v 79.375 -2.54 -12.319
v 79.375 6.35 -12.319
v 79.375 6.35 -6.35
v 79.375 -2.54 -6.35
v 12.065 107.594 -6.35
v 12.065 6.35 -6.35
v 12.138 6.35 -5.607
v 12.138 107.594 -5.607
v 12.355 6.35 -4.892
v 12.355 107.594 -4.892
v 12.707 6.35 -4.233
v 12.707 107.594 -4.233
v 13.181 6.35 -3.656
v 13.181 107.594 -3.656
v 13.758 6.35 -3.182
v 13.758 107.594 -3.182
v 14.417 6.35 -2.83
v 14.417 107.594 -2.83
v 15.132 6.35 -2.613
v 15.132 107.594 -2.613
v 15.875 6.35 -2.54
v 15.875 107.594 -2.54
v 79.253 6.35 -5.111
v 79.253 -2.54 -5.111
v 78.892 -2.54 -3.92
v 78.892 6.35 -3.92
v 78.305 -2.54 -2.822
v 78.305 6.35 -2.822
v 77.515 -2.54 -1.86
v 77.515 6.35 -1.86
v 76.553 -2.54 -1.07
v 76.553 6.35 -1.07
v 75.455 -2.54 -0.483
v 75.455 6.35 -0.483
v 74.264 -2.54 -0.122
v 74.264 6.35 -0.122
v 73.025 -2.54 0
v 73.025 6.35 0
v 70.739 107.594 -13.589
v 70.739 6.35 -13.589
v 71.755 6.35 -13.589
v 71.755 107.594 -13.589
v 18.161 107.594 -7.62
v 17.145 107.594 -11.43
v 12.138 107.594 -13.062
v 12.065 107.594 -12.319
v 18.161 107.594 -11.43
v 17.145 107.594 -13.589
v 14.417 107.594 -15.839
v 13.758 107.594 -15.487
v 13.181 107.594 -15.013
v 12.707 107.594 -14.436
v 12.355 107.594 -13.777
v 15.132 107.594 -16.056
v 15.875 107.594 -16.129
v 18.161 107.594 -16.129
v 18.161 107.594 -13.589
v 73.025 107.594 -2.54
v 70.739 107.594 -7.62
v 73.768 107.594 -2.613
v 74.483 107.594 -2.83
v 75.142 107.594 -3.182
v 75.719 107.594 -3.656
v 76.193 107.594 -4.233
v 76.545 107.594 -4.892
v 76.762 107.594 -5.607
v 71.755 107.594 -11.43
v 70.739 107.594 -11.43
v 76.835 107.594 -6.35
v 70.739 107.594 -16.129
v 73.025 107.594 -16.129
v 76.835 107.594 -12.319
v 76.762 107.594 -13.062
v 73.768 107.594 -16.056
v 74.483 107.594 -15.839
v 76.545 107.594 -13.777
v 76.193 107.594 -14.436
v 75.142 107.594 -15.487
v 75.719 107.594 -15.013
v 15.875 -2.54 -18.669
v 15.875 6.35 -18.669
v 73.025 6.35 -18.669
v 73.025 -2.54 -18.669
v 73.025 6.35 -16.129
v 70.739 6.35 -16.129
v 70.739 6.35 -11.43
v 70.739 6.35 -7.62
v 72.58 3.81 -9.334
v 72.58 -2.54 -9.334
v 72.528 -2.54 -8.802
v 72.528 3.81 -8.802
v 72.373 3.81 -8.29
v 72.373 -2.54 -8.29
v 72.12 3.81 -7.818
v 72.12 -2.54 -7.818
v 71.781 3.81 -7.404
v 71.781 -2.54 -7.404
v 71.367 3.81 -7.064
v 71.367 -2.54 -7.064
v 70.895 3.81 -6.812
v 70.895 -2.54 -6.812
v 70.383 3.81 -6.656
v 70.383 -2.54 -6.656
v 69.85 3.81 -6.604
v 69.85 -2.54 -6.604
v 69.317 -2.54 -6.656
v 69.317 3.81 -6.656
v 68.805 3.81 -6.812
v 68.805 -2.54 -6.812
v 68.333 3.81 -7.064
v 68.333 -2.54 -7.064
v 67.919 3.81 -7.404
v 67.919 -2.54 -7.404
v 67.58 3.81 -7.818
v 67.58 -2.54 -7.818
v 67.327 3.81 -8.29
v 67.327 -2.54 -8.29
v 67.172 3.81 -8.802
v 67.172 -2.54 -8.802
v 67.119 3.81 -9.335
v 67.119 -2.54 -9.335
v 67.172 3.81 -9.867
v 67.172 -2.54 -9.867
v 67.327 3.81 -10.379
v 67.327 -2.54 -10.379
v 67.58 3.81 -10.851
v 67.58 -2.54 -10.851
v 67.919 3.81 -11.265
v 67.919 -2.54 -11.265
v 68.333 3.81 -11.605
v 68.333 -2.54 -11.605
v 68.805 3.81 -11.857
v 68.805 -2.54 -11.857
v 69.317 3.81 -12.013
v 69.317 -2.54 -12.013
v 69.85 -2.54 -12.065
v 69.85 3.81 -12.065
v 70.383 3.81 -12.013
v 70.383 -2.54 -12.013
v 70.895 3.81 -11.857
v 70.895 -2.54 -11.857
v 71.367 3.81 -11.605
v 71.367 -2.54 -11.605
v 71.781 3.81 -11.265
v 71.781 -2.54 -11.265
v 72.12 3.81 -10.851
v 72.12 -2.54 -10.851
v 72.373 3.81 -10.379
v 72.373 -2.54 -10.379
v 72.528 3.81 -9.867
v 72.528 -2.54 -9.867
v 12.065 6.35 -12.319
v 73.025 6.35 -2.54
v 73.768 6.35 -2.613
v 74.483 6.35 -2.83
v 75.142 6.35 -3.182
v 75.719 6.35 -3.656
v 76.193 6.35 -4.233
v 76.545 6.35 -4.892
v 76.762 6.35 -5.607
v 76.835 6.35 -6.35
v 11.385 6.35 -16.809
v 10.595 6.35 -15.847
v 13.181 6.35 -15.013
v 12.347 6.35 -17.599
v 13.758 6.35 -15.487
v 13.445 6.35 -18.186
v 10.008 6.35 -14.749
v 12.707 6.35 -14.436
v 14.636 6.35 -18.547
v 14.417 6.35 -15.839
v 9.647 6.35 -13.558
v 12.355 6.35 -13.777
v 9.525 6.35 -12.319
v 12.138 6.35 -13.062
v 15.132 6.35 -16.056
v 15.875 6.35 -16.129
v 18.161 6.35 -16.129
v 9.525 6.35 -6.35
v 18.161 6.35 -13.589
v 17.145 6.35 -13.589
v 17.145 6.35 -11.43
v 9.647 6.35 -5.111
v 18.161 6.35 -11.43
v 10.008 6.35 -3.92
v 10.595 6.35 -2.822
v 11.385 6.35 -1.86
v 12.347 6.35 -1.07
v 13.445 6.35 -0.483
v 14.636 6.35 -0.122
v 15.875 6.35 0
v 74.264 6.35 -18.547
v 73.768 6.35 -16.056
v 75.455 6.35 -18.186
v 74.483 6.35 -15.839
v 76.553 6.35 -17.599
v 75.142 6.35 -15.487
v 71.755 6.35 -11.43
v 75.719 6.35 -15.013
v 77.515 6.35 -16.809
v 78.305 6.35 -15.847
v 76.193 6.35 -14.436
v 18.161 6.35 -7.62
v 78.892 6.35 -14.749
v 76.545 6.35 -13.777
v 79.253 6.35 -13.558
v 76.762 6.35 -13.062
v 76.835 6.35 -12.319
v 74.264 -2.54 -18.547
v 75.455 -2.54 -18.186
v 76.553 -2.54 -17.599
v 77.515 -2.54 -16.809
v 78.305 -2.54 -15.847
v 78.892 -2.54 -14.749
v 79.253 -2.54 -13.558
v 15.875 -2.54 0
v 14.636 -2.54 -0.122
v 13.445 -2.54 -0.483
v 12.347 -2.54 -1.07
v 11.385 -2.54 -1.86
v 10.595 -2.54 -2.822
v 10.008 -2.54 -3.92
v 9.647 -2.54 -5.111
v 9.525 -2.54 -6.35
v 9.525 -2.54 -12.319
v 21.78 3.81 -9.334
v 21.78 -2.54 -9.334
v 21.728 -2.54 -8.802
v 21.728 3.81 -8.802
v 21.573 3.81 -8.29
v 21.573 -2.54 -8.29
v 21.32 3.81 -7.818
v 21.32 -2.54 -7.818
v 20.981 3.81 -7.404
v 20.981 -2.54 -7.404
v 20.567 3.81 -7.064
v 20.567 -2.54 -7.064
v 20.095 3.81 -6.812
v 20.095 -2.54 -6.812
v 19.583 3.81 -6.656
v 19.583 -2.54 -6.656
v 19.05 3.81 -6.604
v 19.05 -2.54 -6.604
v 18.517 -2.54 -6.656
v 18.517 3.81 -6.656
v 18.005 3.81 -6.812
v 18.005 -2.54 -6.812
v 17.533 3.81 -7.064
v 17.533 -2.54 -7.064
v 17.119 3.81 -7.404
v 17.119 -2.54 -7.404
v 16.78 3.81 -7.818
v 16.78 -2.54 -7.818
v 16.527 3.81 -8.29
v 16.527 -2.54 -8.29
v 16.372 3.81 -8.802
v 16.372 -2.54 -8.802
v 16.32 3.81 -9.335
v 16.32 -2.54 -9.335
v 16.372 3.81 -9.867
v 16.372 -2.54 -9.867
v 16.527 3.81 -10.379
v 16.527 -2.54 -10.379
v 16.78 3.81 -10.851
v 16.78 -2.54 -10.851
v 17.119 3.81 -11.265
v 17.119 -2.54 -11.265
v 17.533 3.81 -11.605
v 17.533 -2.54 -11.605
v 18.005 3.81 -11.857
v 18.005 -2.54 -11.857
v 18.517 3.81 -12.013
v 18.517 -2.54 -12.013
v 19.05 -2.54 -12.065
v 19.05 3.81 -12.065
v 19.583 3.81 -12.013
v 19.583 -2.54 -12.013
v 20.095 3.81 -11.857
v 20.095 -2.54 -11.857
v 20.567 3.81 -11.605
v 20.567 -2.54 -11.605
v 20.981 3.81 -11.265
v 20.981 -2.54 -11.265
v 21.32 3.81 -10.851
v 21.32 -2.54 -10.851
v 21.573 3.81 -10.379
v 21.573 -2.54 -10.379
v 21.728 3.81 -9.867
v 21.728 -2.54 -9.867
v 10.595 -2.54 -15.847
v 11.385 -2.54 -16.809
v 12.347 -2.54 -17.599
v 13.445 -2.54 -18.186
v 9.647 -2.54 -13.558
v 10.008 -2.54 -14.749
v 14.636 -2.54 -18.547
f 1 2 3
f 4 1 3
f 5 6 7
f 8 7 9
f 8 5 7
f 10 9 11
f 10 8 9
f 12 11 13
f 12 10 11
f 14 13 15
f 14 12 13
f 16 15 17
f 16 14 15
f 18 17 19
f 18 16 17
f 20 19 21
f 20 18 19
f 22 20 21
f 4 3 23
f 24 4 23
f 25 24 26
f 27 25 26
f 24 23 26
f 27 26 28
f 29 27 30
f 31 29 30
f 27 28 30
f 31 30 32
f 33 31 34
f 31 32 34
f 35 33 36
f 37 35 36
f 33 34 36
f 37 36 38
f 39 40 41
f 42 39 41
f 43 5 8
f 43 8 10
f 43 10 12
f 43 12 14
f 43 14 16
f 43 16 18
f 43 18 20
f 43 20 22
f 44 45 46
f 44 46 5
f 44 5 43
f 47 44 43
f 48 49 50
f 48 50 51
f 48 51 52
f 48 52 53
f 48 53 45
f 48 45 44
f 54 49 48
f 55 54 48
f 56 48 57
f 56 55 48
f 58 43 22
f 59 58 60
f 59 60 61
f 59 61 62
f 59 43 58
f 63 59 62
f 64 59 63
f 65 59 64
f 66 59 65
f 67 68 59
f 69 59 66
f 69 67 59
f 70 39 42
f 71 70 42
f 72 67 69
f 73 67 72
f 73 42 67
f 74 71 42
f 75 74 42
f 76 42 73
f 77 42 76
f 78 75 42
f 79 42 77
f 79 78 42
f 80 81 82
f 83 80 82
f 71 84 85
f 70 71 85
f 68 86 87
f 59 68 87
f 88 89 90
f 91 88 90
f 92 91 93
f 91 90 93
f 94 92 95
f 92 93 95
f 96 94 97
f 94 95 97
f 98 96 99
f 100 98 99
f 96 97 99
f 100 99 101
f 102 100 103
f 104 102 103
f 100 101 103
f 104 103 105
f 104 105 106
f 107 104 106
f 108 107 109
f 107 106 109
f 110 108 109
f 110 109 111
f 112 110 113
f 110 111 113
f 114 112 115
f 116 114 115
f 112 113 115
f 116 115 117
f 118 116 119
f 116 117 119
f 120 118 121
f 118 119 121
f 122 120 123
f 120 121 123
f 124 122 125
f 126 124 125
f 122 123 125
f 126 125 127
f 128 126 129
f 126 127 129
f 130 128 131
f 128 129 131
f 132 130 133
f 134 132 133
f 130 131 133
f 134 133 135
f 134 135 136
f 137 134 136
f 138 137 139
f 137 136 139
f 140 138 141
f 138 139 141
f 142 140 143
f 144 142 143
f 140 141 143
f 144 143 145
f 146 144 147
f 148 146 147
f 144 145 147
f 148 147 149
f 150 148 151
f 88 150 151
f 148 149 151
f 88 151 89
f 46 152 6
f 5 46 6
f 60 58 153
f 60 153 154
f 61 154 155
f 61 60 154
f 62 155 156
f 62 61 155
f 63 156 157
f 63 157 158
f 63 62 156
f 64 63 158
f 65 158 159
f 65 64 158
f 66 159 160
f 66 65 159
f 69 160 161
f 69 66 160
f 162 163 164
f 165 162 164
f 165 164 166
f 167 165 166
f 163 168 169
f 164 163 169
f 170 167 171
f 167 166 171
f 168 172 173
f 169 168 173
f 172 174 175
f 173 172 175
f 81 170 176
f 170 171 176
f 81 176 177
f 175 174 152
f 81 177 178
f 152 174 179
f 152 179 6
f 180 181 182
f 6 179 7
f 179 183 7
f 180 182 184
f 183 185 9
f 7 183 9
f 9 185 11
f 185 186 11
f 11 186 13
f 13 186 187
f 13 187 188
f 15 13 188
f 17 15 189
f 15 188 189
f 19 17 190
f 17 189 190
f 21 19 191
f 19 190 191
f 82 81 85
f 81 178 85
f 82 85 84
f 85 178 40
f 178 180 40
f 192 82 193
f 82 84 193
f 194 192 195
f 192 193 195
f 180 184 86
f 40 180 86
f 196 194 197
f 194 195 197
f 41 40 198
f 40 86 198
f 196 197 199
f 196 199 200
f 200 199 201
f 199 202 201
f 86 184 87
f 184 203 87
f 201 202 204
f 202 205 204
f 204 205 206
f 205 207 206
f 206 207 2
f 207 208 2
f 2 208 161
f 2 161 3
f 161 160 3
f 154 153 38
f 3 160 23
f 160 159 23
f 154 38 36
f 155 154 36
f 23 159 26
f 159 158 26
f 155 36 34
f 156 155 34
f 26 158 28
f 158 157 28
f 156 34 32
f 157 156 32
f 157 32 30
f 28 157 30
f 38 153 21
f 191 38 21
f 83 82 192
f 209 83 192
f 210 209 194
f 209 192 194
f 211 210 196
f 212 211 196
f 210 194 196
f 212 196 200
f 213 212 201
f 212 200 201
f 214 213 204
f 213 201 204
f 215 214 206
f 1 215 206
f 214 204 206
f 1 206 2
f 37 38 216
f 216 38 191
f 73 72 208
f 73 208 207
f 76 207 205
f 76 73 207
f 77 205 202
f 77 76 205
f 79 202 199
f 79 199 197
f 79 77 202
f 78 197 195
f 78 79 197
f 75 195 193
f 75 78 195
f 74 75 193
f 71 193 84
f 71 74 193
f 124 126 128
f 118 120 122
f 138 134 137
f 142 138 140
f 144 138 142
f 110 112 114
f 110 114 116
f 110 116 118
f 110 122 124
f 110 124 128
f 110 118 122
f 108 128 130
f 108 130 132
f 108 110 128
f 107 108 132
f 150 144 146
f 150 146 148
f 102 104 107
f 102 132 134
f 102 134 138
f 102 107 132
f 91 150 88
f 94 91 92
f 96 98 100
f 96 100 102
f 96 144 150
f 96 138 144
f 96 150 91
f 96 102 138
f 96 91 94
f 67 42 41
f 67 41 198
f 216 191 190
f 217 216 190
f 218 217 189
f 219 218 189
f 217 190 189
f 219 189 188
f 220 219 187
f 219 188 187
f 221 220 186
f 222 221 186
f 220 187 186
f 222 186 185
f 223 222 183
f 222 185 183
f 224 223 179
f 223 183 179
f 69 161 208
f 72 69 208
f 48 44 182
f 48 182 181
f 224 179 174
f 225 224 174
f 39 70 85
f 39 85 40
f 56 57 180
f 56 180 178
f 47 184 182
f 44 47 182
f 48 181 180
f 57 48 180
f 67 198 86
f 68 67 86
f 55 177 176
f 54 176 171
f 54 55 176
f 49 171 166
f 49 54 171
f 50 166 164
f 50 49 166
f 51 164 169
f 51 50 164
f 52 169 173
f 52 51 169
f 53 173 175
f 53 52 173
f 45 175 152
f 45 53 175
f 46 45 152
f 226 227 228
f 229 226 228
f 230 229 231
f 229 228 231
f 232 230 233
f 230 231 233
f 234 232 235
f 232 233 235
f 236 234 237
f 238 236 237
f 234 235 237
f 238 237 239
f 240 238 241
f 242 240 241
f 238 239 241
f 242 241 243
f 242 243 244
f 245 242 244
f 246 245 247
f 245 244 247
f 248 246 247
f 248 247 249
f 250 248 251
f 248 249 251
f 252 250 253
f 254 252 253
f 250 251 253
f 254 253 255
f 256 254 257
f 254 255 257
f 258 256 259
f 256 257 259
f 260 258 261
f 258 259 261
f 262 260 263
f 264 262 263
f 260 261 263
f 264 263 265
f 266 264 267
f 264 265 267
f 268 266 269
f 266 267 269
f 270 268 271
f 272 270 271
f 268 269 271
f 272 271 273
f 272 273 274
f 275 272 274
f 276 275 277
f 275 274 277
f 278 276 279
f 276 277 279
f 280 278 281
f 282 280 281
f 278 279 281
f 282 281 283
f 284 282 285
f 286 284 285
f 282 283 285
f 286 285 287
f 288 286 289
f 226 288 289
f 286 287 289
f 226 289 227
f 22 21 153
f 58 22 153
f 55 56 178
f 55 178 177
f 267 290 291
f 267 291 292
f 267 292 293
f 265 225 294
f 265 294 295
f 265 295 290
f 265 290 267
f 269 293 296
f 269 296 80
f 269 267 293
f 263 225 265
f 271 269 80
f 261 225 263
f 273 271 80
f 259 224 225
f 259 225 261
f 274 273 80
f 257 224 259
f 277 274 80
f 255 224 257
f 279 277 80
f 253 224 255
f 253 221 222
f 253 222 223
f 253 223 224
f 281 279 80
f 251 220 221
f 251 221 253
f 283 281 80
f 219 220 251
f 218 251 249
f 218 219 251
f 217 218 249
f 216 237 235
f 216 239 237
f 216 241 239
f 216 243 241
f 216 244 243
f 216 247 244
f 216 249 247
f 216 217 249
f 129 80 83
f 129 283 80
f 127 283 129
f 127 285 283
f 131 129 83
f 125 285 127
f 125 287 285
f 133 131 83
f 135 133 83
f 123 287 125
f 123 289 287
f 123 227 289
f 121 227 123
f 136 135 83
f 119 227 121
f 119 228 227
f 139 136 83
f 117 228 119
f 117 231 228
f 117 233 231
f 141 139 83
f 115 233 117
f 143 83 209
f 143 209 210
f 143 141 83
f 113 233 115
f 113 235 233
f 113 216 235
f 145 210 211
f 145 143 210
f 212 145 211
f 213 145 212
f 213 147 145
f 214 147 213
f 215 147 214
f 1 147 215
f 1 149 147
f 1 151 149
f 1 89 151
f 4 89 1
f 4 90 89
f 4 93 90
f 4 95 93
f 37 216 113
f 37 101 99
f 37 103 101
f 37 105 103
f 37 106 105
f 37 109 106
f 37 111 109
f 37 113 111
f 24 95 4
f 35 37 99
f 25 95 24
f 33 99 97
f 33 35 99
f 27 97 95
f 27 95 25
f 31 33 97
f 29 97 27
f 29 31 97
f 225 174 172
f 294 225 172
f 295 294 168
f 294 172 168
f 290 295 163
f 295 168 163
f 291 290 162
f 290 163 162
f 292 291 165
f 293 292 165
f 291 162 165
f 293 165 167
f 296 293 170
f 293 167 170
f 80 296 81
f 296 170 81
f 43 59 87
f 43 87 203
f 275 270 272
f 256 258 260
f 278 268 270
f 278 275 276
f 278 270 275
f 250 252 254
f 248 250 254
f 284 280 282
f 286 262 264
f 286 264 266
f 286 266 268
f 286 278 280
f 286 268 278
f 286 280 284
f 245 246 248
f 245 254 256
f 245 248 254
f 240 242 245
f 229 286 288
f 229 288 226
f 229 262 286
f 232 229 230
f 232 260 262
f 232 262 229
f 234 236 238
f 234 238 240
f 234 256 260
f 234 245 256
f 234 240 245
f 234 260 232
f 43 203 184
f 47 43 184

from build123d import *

# Parameters (mm, degrees)
SKETCH2_W               = 88.9
SKETCH2_H               = 152.4
BOSS_EXTRUDE1_DEPTH     = 5.9944
SKETCH4_R               = 2.7305
CUT_EXTRUDE2_DEPTH      = 1
CUT_EXTRUDE2_DEPTH_BACK = 6.9944
BOSS_EXTRUDE2_DEPTH     = 101.6
FILLET1_R               = 3.81
SKETCH7_W               = 2.54
SKETCH7_H               = 152.4
CUT_EXTRUDE3_DEPTH      = 102.6
CUT_EXTRUDE3_DEPTH_BACK = 6.9944
SKETCH11_W              = 86.36
SKETCH11_H              = 152.4
CUT_EXTRUDE4_DEPTH      = 6.35
BOSS_EXTRUDE3_DEPTH     = 8.89
SKETCH13_R              = 2.7305
CUT_EXTRUDE5_DEPTH      = 6.35


with BuildPart() as part:
    # Sketch2 → Boss-Extrude1 (new body)
    with BuildSketch(Plane(origin=(0, 0, 0), x_dir=(1, 0, 0), z_dir=(0, 1, 0))):
        with Locations((44.45, 76.2)):
            Rectangle(SKETCH2_W, SKETCH2_H)
    extrude(amount=BOSS_EXTRUDE1_DEPTH)

    # Sketch4 → Cut-Extrude2 (cut, two sides)
    with BuildSketch(Plane(origin=(0, 5.9944, 0), x_dir=(1, 0, 0), z_dir=(0, 1, 0))) as cut_extrude2_sk:
        with Locations((45.72, 109.871331367)):
            Circle(SKETCH4_R)
        with Locations((45.72, 33.671331367)):
            Circle(SKETCH4_R)
    extrude(amount=CUT_EXTRUDE2_DEPTH, mode=Mode.SUBTRACT)
    extrude(cut_extrude2_sk.sketch, amount=-CUT_EXTRUDE2_DEPTH_BACK, mode=Mode.SUBTRACT)

    # Sketch5 → Boss-Extrude2 (add)
    with BuildSketch(Plane(origin=(0, 5.9944, 0), x_dir=(1, 0, 0), z_dir=(0, 1, 0))):
        Polygon((18.161, 16.129), (12.065, 16.129), (12.065, 2.54), (76.835, 2.54), (76.835, 16.129), (70.739, 16.129), (70.739, 13.589), (71.755, 13.589), (71.755, 11.43), (70.739, 11.43), (70.739, 7.62), (18.161, 7.62), (18.161, 11.43), (17.145, 11.43), (17.145, 13.589), (18.161, 13.589), align=None)
    extrude(amount=BOSS_EXTRUDE2_DEPTH)

    # Fillet1
    fillet1_edges = [part.edges().sort_by_distance(p)[0] for p in [
        (12.065, 56.7944, -16.129),
        (12.065, 56.7944, -2.54),
        (76.835, 56.7944, -2.54),
        (76.835, 56.7944, -16.129),
    ]]
    fillet(fillet1_edges, radius=FILLET1_R)

    # Sketch7 → Cut-Extrude3 (cut, two sides)
    with BuildSketch(Plane(origin=(0, 5.9944, 0), x_dir=(1, 0, 0), z_dir=(0, 1, 0))) as cut_extrude3_sk:
        with Locations((1.27, 76.2)):
            Rectangle(SKETCH7_W, SKETCH7_H)
    extrude(amount=CUT_EXTRUDE3_DEPTH, mode=Mode.SUBTRACT)
    extrude(cut_extrude3_sk.sketch, amount=-CUT_EXTRUDE3_DEPTH_BACK, mode=Mode.SUBTRACT)

    # Sketch11 → Cut-Extrude4 (cut)
    with BuildSketch(Plane.XZ):
        with Locations((45.72, -76.2)):
            Rectangle(SKETCH11_W, SKETCH11_H)
    extrude(amount=-CUT_EXTRUDE4_DEPTH, mode=Mode.SUBTRACT)

    # Sketch12 → Boss-Extrude3 (add)
    with BuildSketch(Plane.XZ.offset(-6.35)):
        with BuildLine():
            Line((9.525, -6.35), (9.525, -12.319))
            ThreePointArc((9.525, -12.319), (11.384871939, -16.809128061), (15.875, -18.669))
            Line((15.875, -18.669), (18.161, -18.669))
            Line((18.161, -18.669), (70.739, -18.669))
            Line((70.739, -18.669), (73.025, -18.669))
            ThreePointArc((73.025, -18.669), (77.515128061, -16.809128061), (79.375, -12.319))
            Line((79.375, -12.319), (79.375, -6.35))
            ThreePointArc((79.375, -6.35), (77.515128061, -1.859871939), (73.025, 0))
            Line((73.025, 0), (15.875, 0))
            ThreePointArc((15.875, 0), (11.384871939, -1.859871939), (9.525, -6.35))
        make_face()
        with BuildLine():
            Line((18.161, -16.129), (70.739, -16.129))
            Line((70.739, -16.129), (73.025, -16.129))
            ThreePointArc((73.025, -16.129), (75.719076836, -15.013076836), (76.835, -12.319))
            Line((76.835, -12.319), (76.835, -6.35))
            ThreePointArc((76.835, -6.35), (75.719076836, -3.655923164), (73.025, -2.54))
            Line((73.025, -2.54), (15.875, -2.54))
            ThreePointArc((15.875, -2.54), (13.180923164, -3.655923164), (12.065, -6.35))
            Line((12.065, -6.35), (12.065, -12.319))
            ThreePointArc((12.065, -12.319), (13.180923164, -15.013076836), (15.875, -16.129))
            Line((15.875, -16.129), (18.161, -16.129))
        make_face(mode=Mode.SUBTRACT)
        with BuildLine():
            Line((70.739, -11.43), (71.755, -11.43))
            Line((71.755, -11.43), (71.755, -13.589))
            Line((71.755, -13.589), (70.739, -13.589))
            Line((70.739, -13.589), (70.739, -16.129))
            Line((70.739, -16.129), (73.025, -16.129))
            ThreePointArc((73.025, -16.129), (75.719076836, -15.013076836), (76.835, -12.319))
            Line((76.835, -12.319), (76.835, -6.35))
            ThreePointArc((76.835, -6.35), (75.719076836, -3.655923164), (73.025, -2.54))
            Line((73.025, -2.54), (15.875, -2.54))
            ThreePointArc((15.875, -2.54), (13.180923164, -3.655923164), (12.065, -6.35))
            Line((12.065, -6.35), (12.065, -12.319))
            ThreePointArc((12.065, -12.319), (13.180923164, -15.013076836), (15.875, -16.129))
            Line((15.875, -16.129), (18.161, -16.129))
            Line((18.161, -16.129), (18.161, -13.589))
            Line((18.161, -13.589), (17.145, -13.589))
            Line((17.145, -13.589), (17.145, -11.43))
            Line((17.145, -11.43), (18.161, -11.43))
            Line((18.161, -11.43), (18.161, -7.62))
            Line((18.161, -7.62), (70.739, -7.62))
            Line((70.739, -7.62), (70.739, -11.43))
        make_face()
        Polygon((18.161, -16.129), (70.739, -16.129), (70.739, -13.589), (71.755, -13.589), (71.755, -11.43), (70.739, -11.43), (70.739, -7.62), (18.161, -7.62), (18.161, -11.43), (17.145, -11.43), (17.145, -13.589), (18.161, -13.589), align=None)
    extrude(amount=BOSS_EXTRUDE3_DEPTH)

    # Sketch13 → Cut-Extrude5 (cut)
    with BuildSketch(Plane.XZ.offset(2.54)):
        with Locations((19.05, -9.3345)):
            Circle(SKETCH13_R)
        with Locations((69.85, -9.3345)):
            Circle(SKETCH13_R)
    extrude(amount=-CUT_EXTRUDE5_DEPTH, mode=Mode.SUBTRACT)


solid = part.part
